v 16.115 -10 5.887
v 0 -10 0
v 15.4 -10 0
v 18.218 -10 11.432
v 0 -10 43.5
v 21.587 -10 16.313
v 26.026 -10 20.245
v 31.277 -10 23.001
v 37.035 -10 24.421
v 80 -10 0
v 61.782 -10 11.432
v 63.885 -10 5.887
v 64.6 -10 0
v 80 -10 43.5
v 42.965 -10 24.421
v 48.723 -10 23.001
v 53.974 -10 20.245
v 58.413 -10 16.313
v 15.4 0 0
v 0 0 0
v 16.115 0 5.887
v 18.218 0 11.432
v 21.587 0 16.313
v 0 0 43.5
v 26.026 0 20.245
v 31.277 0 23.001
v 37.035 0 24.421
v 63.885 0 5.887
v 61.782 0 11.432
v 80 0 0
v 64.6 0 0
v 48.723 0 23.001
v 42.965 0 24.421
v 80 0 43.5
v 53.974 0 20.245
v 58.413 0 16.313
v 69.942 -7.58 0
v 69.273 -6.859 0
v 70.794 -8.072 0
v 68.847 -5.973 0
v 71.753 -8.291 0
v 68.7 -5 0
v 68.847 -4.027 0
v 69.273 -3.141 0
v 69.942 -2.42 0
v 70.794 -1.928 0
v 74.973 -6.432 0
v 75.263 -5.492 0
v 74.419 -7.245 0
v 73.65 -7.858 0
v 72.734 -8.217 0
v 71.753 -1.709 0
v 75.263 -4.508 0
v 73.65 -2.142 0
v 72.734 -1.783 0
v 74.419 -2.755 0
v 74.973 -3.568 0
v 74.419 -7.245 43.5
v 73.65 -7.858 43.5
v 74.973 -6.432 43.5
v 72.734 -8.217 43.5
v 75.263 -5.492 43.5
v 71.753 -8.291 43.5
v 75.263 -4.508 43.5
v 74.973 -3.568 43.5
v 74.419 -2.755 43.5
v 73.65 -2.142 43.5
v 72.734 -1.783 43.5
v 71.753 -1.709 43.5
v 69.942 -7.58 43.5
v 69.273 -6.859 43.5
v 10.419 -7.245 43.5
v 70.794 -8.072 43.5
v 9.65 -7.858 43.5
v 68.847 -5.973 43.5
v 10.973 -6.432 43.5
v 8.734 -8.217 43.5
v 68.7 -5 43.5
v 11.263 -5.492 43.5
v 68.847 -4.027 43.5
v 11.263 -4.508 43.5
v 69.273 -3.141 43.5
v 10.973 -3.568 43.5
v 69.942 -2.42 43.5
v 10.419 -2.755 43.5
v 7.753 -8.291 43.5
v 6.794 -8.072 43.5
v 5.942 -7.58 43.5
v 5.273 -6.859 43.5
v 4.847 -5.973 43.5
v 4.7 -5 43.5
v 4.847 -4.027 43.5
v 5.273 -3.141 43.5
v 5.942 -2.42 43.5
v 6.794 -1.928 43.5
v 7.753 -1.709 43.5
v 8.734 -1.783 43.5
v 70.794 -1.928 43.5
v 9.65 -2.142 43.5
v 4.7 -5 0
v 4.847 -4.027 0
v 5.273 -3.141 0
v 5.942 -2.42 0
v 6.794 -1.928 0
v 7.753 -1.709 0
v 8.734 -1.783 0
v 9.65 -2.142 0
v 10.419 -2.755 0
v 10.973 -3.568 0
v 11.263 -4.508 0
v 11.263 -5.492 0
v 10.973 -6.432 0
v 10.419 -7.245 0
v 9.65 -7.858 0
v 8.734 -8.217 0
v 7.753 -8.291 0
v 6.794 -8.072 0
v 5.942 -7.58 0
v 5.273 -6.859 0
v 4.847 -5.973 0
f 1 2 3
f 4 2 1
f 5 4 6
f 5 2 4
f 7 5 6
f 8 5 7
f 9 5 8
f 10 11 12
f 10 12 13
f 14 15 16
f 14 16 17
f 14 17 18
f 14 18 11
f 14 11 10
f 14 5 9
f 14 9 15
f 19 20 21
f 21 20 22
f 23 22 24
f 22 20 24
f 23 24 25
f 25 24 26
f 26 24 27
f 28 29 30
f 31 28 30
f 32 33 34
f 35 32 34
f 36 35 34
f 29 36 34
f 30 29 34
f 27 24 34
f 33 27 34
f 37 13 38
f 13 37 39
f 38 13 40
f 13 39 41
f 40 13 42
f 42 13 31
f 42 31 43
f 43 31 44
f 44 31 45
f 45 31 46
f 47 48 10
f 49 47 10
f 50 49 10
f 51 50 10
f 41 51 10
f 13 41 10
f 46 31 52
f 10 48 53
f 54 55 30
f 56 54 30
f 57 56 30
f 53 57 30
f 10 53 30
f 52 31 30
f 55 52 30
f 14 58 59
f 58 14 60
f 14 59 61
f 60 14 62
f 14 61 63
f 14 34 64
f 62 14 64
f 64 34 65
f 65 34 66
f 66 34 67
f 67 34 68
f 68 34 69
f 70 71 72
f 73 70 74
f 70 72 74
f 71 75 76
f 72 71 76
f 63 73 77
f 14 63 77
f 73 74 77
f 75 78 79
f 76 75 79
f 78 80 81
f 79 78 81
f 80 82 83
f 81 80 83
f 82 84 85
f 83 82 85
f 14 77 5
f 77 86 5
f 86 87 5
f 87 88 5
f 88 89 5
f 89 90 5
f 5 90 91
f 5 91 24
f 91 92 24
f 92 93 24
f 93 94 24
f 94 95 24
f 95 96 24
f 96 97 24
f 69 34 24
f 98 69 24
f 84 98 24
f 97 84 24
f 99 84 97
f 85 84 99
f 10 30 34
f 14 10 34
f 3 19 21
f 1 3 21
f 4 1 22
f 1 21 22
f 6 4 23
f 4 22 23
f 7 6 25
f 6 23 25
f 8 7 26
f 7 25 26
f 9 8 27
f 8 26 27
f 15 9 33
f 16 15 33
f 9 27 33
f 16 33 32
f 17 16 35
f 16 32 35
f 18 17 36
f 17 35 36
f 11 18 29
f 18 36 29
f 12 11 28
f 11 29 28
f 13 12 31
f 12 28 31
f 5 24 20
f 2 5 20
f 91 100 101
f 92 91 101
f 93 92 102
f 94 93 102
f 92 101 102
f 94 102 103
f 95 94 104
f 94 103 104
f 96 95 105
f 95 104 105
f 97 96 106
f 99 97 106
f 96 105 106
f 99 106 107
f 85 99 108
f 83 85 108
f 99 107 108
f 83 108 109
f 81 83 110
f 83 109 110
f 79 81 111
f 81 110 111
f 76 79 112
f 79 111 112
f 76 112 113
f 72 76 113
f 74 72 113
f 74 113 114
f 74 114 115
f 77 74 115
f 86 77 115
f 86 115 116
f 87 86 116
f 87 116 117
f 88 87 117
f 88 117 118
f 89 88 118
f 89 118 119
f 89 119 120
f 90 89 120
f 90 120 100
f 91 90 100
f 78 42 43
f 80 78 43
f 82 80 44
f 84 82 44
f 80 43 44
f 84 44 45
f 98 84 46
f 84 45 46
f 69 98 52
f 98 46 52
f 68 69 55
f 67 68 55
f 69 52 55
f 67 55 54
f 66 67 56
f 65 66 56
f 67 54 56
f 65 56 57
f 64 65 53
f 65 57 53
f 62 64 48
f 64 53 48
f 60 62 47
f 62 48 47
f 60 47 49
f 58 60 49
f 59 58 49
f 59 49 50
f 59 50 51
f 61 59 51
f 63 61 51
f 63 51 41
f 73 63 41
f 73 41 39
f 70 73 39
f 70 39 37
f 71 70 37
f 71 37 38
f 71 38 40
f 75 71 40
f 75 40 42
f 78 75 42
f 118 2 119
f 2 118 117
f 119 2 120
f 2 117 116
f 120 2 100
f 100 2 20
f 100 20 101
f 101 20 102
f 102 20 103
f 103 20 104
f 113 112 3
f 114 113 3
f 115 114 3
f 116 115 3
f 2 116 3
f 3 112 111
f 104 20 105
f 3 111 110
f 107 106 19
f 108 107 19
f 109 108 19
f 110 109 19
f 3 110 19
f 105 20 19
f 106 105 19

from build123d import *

# Parameters (mm, degrees)
F1_DEPTH = 10
F3_D     = 6.6


with BuildPart() as f1:
    # F0 (on Front) → F1 (new body)
    with BuildSketch(Plane.XZ):
        with BuildLine():
            Line((0, 43.5), (0, 0))
            Line((0, 0), (15.4, 0))
            ThreePointArc((15.4, 0), (40, 24.6), (64.6, 0))
            Line((64.6, 0), (80, 0))
            Line((80, 0), (80, 43.5))
            Line((80, 43.5), (0, 43.5))
        make_face()
    extrude(amount=F1_DEPTH)

    # F3 (through all)
    with Locations(Plane.XY.offset(43.5)):
        with Locations((8, -5), (72, -5)):
            Hole(F3_D / 2)


solid = f1.part
